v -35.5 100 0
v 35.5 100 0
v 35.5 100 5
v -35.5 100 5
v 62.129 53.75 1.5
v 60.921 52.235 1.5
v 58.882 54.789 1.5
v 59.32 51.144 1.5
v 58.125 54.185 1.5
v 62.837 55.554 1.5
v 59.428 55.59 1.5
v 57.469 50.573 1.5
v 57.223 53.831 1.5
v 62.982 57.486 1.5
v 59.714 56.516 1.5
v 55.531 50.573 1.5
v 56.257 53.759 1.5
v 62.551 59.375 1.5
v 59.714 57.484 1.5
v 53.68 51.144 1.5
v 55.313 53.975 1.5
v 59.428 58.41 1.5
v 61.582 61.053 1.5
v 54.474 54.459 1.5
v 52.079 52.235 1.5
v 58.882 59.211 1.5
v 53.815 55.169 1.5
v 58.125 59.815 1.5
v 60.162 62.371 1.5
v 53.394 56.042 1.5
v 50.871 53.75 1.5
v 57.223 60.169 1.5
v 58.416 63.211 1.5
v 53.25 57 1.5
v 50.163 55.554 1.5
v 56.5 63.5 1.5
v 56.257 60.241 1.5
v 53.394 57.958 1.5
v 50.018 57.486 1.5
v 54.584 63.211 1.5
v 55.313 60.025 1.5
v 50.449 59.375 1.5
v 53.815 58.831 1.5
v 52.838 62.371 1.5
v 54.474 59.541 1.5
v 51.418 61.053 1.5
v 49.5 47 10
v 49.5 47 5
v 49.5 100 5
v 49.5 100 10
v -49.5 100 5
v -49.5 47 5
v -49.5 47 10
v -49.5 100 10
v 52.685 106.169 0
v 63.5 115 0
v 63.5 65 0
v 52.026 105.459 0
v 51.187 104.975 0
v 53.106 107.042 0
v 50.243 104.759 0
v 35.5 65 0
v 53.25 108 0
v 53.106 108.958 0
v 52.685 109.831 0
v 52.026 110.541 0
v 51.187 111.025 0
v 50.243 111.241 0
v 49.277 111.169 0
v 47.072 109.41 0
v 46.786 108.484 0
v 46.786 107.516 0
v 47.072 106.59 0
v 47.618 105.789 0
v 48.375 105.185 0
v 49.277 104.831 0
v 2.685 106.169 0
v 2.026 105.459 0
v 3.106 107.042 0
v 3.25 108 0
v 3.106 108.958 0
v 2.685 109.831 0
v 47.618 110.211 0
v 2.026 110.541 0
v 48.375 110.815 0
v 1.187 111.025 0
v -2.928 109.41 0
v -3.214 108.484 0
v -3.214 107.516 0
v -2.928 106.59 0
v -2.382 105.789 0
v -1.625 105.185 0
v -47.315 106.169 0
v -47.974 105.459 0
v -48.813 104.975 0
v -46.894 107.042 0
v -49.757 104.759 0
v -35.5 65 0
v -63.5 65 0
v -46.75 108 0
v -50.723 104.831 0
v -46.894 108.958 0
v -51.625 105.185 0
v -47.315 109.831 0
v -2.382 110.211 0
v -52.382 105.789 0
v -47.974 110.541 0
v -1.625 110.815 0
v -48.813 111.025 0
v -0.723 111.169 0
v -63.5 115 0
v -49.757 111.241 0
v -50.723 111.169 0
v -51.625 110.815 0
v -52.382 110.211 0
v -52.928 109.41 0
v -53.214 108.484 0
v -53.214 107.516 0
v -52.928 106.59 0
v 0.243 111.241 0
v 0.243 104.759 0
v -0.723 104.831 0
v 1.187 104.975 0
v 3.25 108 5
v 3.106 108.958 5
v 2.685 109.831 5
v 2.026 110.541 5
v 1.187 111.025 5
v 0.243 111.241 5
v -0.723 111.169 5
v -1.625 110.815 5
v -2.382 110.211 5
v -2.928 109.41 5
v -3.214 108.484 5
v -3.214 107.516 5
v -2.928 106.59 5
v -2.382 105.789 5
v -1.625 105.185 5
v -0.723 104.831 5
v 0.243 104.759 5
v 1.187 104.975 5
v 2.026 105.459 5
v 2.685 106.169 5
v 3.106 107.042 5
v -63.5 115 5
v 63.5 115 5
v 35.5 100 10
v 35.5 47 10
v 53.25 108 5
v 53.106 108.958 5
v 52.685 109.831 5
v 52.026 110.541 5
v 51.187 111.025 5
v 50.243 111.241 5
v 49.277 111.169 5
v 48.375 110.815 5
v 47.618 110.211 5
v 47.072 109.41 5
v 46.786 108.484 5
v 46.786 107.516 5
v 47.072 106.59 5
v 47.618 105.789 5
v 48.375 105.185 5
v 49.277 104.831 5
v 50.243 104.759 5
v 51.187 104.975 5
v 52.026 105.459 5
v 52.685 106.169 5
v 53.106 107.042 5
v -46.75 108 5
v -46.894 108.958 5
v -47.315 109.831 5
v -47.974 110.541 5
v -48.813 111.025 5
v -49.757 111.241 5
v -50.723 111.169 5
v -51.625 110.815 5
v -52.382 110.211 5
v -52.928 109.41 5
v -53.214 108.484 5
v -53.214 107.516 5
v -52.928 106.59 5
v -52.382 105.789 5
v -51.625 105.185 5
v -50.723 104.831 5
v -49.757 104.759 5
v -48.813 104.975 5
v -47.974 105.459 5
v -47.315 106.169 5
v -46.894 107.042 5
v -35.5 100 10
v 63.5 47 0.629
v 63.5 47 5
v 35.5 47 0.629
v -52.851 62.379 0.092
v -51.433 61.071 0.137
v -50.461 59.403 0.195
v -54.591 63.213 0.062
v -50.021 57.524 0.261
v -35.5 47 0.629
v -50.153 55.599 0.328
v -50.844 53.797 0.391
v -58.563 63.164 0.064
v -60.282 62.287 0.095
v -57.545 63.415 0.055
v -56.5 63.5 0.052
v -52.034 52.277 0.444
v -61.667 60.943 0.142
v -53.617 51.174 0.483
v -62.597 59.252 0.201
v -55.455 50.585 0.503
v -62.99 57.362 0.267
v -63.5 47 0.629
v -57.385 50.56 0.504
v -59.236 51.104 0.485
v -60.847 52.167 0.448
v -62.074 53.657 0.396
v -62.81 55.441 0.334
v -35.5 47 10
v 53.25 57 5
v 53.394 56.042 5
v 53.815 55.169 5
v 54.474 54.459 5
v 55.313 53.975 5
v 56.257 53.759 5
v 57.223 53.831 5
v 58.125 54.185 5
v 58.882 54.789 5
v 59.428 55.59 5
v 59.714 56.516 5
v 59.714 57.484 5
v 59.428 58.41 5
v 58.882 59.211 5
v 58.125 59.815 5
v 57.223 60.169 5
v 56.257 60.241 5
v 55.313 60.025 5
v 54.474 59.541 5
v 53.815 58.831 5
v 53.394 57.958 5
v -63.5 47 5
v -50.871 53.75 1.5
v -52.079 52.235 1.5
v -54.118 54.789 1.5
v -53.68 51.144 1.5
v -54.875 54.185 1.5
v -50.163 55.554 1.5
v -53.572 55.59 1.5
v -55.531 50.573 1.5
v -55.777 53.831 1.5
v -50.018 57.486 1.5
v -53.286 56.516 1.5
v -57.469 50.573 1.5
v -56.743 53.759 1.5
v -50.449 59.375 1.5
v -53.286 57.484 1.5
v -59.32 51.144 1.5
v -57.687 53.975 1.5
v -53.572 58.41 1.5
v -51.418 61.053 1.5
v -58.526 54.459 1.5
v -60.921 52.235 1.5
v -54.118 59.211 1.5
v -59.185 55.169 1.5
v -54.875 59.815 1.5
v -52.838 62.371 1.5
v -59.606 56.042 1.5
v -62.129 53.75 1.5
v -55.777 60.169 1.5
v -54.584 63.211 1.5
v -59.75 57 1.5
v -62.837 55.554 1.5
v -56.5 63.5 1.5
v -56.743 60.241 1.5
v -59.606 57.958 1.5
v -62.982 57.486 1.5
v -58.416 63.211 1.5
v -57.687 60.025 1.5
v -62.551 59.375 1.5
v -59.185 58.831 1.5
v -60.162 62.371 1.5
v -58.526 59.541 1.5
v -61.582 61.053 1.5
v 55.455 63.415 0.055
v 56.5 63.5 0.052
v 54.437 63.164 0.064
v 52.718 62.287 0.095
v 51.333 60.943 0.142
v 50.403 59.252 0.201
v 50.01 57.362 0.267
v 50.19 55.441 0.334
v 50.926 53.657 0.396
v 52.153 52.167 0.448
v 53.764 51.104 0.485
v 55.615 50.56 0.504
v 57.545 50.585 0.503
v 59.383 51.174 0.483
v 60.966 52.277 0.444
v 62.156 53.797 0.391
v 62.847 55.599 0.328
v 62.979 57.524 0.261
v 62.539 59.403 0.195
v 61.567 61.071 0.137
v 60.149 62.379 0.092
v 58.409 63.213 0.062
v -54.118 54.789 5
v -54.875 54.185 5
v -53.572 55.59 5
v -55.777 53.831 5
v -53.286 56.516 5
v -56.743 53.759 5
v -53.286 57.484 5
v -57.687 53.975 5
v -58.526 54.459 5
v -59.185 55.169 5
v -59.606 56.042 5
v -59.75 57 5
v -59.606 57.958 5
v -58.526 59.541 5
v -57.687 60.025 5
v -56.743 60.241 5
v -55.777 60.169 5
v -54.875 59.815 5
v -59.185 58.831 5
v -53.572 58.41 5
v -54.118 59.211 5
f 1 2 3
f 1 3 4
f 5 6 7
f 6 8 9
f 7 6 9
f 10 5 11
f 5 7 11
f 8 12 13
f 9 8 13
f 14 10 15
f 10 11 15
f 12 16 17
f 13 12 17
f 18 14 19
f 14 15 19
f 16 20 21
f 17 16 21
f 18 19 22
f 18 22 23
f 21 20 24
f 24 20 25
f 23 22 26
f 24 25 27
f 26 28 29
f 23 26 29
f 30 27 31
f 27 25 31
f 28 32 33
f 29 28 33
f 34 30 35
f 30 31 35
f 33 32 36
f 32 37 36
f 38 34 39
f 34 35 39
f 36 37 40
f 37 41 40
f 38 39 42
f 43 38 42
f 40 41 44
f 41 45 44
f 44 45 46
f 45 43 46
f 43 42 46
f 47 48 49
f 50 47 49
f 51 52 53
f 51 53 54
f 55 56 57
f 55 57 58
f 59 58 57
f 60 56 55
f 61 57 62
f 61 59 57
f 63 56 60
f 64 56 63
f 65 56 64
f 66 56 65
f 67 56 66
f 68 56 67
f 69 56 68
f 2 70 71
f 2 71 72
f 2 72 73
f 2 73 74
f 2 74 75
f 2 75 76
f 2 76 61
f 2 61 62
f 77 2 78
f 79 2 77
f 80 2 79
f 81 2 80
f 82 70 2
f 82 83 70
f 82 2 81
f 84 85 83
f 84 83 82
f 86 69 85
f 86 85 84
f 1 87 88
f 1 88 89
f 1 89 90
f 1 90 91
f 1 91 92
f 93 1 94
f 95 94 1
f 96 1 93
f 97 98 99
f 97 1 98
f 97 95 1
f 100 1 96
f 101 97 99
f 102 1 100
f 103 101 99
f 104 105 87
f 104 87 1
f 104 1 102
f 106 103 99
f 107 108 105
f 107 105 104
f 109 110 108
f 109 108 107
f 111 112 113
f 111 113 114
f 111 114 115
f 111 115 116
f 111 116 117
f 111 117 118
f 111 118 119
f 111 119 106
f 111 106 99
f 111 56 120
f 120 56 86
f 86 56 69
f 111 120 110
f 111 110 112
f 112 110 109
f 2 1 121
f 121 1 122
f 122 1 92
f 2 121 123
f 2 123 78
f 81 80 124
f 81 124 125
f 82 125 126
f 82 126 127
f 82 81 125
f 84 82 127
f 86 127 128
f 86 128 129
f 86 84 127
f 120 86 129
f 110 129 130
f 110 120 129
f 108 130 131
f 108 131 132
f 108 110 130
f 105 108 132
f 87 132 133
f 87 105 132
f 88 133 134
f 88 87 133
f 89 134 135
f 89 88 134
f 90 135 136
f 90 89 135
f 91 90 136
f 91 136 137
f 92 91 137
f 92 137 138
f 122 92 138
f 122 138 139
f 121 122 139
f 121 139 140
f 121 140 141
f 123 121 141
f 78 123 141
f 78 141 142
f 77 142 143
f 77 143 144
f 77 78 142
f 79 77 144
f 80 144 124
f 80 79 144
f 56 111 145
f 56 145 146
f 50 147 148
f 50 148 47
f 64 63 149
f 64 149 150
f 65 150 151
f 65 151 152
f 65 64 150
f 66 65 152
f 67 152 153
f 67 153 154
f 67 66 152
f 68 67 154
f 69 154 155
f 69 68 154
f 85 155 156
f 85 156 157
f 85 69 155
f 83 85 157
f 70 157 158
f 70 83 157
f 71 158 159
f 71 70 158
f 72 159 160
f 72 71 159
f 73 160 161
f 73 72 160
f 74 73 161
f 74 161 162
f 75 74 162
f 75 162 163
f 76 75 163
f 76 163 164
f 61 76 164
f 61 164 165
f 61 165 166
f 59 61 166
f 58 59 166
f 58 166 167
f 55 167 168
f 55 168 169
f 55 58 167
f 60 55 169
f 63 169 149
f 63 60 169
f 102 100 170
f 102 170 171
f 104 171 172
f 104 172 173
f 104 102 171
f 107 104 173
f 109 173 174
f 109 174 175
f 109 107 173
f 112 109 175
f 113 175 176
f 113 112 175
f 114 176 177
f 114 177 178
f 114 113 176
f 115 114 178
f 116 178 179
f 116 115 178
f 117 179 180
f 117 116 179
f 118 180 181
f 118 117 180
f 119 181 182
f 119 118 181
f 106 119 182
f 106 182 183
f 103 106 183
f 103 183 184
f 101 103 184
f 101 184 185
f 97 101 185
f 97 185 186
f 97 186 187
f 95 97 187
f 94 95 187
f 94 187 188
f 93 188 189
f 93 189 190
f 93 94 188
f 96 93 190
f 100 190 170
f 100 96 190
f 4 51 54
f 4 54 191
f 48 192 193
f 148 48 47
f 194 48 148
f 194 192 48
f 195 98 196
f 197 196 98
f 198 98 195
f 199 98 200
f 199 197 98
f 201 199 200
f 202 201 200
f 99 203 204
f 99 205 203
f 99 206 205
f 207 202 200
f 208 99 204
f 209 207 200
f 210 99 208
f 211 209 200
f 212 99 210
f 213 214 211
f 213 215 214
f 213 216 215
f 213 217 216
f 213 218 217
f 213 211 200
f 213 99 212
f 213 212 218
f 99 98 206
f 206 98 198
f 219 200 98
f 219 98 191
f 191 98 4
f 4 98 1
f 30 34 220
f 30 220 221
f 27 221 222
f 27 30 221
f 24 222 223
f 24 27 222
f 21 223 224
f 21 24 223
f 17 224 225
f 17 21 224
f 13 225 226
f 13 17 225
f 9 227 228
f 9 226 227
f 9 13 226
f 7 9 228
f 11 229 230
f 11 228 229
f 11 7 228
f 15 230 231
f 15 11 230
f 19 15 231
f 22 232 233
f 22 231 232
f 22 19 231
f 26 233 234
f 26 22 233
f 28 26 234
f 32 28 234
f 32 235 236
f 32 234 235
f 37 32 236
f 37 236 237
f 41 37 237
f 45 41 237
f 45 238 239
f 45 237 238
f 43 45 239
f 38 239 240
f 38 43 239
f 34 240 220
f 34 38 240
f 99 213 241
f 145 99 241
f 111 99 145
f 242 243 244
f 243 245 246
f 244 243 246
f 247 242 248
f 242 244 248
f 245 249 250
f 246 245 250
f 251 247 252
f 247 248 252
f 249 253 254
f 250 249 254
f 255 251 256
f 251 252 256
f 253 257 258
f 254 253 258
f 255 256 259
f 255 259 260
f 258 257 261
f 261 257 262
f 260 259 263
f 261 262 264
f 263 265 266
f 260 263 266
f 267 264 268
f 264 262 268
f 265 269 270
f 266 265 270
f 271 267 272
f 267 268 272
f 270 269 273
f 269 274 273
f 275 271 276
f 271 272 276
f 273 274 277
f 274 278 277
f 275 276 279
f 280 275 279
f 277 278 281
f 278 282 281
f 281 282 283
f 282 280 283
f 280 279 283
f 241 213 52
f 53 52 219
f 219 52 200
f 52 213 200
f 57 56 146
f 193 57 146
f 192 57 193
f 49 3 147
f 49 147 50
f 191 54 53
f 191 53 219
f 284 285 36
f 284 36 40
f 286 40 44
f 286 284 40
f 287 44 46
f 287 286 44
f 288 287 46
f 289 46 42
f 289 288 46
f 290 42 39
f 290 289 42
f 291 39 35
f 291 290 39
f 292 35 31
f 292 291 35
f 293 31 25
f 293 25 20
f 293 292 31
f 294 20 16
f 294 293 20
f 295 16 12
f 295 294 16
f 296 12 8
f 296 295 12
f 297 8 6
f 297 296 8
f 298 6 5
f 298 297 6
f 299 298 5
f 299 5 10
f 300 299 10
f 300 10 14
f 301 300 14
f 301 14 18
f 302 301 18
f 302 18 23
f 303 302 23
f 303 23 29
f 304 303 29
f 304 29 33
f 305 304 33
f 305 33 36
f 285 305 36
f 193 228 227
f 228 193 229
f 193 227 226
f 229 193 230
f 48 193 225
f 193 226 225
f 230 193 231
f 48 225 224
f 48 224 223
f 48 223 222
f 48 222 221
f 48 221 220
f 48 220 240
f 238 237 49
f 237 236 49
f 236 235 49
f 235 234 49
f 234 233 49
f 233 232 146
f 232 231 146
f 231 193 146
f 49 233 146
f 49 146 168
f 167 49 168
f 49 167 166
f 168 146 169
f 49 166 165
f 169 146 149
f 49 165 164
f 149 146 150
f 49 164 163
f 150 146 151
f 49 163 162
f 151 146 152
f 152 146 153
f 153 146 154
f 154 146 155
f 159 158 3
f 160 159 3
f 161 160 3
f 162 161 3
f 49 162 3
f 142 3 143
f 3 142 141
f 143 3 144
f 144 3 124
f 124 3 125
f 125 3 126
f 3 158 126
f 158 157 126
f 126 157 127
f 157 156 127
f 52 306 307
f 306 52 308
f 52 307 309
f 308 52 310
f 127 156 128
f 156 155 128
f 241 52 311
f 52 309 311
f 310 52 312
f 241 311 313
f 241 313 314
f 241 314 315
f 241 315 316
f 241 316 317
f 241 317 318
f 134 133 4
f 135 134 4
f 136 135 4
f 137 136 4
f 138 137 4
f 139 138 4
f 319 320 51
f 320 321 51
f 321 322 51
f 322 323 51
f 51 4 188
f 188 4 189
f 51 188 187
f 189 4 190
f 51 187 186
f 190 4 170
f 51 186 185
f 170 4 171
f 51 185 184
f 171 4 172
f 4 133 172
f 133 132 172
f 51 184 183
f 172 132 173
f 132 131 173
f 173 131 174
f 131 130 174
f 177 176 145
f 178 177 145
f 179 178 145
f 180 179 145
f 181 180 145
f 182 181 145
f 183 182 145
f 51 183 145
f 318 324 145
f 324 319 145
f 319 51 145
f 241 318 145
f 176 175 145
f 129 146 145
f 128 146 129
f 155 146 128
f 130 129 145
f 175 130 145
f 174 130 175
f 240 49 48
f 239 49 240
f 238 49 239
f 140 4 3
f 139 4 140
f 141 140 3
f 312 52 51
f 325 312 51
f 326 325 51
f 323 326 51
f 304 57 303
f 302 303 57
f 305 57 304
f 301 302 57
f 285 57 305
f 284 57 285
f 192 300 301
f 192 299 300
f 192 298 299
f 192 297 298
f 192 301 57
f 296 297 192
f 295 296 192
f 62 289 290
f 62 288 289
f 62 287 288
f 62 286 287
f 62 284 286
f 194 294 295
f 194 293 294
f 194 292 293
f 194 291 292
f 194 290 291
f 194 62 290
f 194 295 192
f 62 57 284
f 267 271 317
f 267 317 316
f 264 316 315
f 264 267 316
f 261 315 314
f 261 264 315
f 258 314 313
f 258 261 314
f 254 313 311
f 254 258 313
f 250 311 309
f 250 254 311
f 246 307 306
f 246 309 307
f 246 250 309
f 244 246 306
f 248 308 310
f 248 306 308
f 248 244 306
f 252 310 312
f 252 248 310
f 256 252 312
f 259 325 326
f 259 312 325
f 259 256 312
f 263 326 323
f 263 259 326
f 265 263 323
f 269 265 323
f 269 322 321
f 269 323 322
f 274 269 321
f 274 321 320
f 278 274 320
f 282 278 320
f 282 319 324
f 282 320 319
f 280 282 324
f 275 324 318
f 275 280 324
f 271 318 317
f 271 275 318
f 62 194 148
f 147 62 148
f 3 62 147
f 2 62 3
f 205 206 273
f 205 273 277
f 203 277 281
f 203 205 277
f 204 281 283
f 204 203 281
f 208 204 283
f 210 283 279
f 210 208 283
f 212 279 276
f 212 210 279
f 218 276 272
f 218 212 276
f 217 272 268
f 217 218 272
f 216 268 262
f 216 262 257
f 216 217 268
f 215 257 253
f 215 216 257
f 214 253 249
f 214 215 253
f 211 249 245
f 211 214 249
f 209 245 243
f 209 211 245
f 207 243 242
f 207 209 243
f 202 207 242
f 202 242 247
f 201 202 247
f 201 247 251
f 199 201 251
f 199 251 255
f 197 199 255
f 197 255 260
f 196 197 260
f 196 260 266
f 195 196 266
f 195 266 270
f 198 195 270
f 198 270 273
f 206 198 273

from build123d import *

# Parameters (mm, degrees)
SKETCH2_R            = 3.25
BOSS_EXTRUDE2_DEPTH  = 5
SKETCH4_W            = 14
SKETCH4_H            = 53
RIBS_DEPTH           = 5
ANGLE_CUT_DEPTH      = 132.746916472
ANGLE_CUT_DEPTH_BACK = 132.746916472
SKETCH3_R            = 6.5
COUNTERBORE_DEPTH    = 1.5
SKETCH6_R            = 3.25
BOLT_THRU_HOLE_DEPTH = 105.895123001


with BuildPart() as part:
    # Sketch2 → Boss-Extrude2 (new body)
    with BuildSketch(Plane.XY):
        Polygon((-63.5, 47), (-63.5, 115), (63.5, 115), (63.5, 47), (35.5, 47), (35.5, 100), (-35.5, 100), (-35.5, 47), align=None)
        with Locations((-50, 108)):
            Circle(SKETCH2_R, mode=Mode.SUBTRACT)
        with Locations((50, 108)):
            Circle(SKETCH2_R, mode=Mode.SUBTRACT)
        with Locations((0, 108)):
            Circle(SKETCH2_R, mode=Mode.SUBTRACT)
    extrude(amount=BOSS_EXTRUDE2_DEPTH)

    # Sketch4 → Ribs (add)
    with BuildSketch(Plane.XY.offset(5)):
        with Locations((-42.5, 73.5)):
            Rectangle(SKETCH4_W, SKETCH4_H)
        with Locations((42.5, 73.5)):
            Rectangle(SKETCH4_W, SKETCH4_H)
    extrude(amount=RIBS_DEPTH)

    # Sketch5 → Angle Cut (cut, two sides: drawn at the far end of the back side and taken through both)
    with BuildSketch(Plane(origin=(0, 0, 0), x_dir=(0, 0, -1), z_dir=(1, 0, 0)).offset(-ANGLE_CUT_DEPTH_BACK)):
        Polygon((0, 47), (0, 65), (-0.628573851, 47), align=None)
    extrude(amount=ANGLE_CUT_DEPTH + ANGLE_CUT_DEPTH_BACK, mode=Mode.SUBTRACT)

    # Sketch3 → Counterbore (cut)
    with BuildSketch(Plane(origin=(0, 93.494633495, 0), x_dir=(-1, 0, 0), z_dir=(0, 0, 1))):
        with Locations(Location((56.5, 36.494633495, 0), (0, 0, 270))):
            Circle(SKETCH3_R)
        with Locations(Location((-56.5, 36.494633495, 0), (0, 0, 270))):
            Circle(SKETCH3_R)
    extrude(amount=COUNTERBORE_DEPTH, mode=Mode.SUBTRACT)

    # Sketch6 → Bolt thru-hole (cut, through all)
    with BuildSketch(Plane(origin=(0, 129.889907886, 0), x_dir=(-1, 0, 0), z_dir=(0, 0, 1))):
        with Locations((-56.5, 72.889907886)):
            Circle(SKETCH6_R)
        with Locations((56.5, 72.889907886)):
            Circle(SKETCH6_R)
    extrude(amount=BOLT_THRU_HOLE_DEPTH, mode=Mode.SUBTRACT)


solid = part.part
